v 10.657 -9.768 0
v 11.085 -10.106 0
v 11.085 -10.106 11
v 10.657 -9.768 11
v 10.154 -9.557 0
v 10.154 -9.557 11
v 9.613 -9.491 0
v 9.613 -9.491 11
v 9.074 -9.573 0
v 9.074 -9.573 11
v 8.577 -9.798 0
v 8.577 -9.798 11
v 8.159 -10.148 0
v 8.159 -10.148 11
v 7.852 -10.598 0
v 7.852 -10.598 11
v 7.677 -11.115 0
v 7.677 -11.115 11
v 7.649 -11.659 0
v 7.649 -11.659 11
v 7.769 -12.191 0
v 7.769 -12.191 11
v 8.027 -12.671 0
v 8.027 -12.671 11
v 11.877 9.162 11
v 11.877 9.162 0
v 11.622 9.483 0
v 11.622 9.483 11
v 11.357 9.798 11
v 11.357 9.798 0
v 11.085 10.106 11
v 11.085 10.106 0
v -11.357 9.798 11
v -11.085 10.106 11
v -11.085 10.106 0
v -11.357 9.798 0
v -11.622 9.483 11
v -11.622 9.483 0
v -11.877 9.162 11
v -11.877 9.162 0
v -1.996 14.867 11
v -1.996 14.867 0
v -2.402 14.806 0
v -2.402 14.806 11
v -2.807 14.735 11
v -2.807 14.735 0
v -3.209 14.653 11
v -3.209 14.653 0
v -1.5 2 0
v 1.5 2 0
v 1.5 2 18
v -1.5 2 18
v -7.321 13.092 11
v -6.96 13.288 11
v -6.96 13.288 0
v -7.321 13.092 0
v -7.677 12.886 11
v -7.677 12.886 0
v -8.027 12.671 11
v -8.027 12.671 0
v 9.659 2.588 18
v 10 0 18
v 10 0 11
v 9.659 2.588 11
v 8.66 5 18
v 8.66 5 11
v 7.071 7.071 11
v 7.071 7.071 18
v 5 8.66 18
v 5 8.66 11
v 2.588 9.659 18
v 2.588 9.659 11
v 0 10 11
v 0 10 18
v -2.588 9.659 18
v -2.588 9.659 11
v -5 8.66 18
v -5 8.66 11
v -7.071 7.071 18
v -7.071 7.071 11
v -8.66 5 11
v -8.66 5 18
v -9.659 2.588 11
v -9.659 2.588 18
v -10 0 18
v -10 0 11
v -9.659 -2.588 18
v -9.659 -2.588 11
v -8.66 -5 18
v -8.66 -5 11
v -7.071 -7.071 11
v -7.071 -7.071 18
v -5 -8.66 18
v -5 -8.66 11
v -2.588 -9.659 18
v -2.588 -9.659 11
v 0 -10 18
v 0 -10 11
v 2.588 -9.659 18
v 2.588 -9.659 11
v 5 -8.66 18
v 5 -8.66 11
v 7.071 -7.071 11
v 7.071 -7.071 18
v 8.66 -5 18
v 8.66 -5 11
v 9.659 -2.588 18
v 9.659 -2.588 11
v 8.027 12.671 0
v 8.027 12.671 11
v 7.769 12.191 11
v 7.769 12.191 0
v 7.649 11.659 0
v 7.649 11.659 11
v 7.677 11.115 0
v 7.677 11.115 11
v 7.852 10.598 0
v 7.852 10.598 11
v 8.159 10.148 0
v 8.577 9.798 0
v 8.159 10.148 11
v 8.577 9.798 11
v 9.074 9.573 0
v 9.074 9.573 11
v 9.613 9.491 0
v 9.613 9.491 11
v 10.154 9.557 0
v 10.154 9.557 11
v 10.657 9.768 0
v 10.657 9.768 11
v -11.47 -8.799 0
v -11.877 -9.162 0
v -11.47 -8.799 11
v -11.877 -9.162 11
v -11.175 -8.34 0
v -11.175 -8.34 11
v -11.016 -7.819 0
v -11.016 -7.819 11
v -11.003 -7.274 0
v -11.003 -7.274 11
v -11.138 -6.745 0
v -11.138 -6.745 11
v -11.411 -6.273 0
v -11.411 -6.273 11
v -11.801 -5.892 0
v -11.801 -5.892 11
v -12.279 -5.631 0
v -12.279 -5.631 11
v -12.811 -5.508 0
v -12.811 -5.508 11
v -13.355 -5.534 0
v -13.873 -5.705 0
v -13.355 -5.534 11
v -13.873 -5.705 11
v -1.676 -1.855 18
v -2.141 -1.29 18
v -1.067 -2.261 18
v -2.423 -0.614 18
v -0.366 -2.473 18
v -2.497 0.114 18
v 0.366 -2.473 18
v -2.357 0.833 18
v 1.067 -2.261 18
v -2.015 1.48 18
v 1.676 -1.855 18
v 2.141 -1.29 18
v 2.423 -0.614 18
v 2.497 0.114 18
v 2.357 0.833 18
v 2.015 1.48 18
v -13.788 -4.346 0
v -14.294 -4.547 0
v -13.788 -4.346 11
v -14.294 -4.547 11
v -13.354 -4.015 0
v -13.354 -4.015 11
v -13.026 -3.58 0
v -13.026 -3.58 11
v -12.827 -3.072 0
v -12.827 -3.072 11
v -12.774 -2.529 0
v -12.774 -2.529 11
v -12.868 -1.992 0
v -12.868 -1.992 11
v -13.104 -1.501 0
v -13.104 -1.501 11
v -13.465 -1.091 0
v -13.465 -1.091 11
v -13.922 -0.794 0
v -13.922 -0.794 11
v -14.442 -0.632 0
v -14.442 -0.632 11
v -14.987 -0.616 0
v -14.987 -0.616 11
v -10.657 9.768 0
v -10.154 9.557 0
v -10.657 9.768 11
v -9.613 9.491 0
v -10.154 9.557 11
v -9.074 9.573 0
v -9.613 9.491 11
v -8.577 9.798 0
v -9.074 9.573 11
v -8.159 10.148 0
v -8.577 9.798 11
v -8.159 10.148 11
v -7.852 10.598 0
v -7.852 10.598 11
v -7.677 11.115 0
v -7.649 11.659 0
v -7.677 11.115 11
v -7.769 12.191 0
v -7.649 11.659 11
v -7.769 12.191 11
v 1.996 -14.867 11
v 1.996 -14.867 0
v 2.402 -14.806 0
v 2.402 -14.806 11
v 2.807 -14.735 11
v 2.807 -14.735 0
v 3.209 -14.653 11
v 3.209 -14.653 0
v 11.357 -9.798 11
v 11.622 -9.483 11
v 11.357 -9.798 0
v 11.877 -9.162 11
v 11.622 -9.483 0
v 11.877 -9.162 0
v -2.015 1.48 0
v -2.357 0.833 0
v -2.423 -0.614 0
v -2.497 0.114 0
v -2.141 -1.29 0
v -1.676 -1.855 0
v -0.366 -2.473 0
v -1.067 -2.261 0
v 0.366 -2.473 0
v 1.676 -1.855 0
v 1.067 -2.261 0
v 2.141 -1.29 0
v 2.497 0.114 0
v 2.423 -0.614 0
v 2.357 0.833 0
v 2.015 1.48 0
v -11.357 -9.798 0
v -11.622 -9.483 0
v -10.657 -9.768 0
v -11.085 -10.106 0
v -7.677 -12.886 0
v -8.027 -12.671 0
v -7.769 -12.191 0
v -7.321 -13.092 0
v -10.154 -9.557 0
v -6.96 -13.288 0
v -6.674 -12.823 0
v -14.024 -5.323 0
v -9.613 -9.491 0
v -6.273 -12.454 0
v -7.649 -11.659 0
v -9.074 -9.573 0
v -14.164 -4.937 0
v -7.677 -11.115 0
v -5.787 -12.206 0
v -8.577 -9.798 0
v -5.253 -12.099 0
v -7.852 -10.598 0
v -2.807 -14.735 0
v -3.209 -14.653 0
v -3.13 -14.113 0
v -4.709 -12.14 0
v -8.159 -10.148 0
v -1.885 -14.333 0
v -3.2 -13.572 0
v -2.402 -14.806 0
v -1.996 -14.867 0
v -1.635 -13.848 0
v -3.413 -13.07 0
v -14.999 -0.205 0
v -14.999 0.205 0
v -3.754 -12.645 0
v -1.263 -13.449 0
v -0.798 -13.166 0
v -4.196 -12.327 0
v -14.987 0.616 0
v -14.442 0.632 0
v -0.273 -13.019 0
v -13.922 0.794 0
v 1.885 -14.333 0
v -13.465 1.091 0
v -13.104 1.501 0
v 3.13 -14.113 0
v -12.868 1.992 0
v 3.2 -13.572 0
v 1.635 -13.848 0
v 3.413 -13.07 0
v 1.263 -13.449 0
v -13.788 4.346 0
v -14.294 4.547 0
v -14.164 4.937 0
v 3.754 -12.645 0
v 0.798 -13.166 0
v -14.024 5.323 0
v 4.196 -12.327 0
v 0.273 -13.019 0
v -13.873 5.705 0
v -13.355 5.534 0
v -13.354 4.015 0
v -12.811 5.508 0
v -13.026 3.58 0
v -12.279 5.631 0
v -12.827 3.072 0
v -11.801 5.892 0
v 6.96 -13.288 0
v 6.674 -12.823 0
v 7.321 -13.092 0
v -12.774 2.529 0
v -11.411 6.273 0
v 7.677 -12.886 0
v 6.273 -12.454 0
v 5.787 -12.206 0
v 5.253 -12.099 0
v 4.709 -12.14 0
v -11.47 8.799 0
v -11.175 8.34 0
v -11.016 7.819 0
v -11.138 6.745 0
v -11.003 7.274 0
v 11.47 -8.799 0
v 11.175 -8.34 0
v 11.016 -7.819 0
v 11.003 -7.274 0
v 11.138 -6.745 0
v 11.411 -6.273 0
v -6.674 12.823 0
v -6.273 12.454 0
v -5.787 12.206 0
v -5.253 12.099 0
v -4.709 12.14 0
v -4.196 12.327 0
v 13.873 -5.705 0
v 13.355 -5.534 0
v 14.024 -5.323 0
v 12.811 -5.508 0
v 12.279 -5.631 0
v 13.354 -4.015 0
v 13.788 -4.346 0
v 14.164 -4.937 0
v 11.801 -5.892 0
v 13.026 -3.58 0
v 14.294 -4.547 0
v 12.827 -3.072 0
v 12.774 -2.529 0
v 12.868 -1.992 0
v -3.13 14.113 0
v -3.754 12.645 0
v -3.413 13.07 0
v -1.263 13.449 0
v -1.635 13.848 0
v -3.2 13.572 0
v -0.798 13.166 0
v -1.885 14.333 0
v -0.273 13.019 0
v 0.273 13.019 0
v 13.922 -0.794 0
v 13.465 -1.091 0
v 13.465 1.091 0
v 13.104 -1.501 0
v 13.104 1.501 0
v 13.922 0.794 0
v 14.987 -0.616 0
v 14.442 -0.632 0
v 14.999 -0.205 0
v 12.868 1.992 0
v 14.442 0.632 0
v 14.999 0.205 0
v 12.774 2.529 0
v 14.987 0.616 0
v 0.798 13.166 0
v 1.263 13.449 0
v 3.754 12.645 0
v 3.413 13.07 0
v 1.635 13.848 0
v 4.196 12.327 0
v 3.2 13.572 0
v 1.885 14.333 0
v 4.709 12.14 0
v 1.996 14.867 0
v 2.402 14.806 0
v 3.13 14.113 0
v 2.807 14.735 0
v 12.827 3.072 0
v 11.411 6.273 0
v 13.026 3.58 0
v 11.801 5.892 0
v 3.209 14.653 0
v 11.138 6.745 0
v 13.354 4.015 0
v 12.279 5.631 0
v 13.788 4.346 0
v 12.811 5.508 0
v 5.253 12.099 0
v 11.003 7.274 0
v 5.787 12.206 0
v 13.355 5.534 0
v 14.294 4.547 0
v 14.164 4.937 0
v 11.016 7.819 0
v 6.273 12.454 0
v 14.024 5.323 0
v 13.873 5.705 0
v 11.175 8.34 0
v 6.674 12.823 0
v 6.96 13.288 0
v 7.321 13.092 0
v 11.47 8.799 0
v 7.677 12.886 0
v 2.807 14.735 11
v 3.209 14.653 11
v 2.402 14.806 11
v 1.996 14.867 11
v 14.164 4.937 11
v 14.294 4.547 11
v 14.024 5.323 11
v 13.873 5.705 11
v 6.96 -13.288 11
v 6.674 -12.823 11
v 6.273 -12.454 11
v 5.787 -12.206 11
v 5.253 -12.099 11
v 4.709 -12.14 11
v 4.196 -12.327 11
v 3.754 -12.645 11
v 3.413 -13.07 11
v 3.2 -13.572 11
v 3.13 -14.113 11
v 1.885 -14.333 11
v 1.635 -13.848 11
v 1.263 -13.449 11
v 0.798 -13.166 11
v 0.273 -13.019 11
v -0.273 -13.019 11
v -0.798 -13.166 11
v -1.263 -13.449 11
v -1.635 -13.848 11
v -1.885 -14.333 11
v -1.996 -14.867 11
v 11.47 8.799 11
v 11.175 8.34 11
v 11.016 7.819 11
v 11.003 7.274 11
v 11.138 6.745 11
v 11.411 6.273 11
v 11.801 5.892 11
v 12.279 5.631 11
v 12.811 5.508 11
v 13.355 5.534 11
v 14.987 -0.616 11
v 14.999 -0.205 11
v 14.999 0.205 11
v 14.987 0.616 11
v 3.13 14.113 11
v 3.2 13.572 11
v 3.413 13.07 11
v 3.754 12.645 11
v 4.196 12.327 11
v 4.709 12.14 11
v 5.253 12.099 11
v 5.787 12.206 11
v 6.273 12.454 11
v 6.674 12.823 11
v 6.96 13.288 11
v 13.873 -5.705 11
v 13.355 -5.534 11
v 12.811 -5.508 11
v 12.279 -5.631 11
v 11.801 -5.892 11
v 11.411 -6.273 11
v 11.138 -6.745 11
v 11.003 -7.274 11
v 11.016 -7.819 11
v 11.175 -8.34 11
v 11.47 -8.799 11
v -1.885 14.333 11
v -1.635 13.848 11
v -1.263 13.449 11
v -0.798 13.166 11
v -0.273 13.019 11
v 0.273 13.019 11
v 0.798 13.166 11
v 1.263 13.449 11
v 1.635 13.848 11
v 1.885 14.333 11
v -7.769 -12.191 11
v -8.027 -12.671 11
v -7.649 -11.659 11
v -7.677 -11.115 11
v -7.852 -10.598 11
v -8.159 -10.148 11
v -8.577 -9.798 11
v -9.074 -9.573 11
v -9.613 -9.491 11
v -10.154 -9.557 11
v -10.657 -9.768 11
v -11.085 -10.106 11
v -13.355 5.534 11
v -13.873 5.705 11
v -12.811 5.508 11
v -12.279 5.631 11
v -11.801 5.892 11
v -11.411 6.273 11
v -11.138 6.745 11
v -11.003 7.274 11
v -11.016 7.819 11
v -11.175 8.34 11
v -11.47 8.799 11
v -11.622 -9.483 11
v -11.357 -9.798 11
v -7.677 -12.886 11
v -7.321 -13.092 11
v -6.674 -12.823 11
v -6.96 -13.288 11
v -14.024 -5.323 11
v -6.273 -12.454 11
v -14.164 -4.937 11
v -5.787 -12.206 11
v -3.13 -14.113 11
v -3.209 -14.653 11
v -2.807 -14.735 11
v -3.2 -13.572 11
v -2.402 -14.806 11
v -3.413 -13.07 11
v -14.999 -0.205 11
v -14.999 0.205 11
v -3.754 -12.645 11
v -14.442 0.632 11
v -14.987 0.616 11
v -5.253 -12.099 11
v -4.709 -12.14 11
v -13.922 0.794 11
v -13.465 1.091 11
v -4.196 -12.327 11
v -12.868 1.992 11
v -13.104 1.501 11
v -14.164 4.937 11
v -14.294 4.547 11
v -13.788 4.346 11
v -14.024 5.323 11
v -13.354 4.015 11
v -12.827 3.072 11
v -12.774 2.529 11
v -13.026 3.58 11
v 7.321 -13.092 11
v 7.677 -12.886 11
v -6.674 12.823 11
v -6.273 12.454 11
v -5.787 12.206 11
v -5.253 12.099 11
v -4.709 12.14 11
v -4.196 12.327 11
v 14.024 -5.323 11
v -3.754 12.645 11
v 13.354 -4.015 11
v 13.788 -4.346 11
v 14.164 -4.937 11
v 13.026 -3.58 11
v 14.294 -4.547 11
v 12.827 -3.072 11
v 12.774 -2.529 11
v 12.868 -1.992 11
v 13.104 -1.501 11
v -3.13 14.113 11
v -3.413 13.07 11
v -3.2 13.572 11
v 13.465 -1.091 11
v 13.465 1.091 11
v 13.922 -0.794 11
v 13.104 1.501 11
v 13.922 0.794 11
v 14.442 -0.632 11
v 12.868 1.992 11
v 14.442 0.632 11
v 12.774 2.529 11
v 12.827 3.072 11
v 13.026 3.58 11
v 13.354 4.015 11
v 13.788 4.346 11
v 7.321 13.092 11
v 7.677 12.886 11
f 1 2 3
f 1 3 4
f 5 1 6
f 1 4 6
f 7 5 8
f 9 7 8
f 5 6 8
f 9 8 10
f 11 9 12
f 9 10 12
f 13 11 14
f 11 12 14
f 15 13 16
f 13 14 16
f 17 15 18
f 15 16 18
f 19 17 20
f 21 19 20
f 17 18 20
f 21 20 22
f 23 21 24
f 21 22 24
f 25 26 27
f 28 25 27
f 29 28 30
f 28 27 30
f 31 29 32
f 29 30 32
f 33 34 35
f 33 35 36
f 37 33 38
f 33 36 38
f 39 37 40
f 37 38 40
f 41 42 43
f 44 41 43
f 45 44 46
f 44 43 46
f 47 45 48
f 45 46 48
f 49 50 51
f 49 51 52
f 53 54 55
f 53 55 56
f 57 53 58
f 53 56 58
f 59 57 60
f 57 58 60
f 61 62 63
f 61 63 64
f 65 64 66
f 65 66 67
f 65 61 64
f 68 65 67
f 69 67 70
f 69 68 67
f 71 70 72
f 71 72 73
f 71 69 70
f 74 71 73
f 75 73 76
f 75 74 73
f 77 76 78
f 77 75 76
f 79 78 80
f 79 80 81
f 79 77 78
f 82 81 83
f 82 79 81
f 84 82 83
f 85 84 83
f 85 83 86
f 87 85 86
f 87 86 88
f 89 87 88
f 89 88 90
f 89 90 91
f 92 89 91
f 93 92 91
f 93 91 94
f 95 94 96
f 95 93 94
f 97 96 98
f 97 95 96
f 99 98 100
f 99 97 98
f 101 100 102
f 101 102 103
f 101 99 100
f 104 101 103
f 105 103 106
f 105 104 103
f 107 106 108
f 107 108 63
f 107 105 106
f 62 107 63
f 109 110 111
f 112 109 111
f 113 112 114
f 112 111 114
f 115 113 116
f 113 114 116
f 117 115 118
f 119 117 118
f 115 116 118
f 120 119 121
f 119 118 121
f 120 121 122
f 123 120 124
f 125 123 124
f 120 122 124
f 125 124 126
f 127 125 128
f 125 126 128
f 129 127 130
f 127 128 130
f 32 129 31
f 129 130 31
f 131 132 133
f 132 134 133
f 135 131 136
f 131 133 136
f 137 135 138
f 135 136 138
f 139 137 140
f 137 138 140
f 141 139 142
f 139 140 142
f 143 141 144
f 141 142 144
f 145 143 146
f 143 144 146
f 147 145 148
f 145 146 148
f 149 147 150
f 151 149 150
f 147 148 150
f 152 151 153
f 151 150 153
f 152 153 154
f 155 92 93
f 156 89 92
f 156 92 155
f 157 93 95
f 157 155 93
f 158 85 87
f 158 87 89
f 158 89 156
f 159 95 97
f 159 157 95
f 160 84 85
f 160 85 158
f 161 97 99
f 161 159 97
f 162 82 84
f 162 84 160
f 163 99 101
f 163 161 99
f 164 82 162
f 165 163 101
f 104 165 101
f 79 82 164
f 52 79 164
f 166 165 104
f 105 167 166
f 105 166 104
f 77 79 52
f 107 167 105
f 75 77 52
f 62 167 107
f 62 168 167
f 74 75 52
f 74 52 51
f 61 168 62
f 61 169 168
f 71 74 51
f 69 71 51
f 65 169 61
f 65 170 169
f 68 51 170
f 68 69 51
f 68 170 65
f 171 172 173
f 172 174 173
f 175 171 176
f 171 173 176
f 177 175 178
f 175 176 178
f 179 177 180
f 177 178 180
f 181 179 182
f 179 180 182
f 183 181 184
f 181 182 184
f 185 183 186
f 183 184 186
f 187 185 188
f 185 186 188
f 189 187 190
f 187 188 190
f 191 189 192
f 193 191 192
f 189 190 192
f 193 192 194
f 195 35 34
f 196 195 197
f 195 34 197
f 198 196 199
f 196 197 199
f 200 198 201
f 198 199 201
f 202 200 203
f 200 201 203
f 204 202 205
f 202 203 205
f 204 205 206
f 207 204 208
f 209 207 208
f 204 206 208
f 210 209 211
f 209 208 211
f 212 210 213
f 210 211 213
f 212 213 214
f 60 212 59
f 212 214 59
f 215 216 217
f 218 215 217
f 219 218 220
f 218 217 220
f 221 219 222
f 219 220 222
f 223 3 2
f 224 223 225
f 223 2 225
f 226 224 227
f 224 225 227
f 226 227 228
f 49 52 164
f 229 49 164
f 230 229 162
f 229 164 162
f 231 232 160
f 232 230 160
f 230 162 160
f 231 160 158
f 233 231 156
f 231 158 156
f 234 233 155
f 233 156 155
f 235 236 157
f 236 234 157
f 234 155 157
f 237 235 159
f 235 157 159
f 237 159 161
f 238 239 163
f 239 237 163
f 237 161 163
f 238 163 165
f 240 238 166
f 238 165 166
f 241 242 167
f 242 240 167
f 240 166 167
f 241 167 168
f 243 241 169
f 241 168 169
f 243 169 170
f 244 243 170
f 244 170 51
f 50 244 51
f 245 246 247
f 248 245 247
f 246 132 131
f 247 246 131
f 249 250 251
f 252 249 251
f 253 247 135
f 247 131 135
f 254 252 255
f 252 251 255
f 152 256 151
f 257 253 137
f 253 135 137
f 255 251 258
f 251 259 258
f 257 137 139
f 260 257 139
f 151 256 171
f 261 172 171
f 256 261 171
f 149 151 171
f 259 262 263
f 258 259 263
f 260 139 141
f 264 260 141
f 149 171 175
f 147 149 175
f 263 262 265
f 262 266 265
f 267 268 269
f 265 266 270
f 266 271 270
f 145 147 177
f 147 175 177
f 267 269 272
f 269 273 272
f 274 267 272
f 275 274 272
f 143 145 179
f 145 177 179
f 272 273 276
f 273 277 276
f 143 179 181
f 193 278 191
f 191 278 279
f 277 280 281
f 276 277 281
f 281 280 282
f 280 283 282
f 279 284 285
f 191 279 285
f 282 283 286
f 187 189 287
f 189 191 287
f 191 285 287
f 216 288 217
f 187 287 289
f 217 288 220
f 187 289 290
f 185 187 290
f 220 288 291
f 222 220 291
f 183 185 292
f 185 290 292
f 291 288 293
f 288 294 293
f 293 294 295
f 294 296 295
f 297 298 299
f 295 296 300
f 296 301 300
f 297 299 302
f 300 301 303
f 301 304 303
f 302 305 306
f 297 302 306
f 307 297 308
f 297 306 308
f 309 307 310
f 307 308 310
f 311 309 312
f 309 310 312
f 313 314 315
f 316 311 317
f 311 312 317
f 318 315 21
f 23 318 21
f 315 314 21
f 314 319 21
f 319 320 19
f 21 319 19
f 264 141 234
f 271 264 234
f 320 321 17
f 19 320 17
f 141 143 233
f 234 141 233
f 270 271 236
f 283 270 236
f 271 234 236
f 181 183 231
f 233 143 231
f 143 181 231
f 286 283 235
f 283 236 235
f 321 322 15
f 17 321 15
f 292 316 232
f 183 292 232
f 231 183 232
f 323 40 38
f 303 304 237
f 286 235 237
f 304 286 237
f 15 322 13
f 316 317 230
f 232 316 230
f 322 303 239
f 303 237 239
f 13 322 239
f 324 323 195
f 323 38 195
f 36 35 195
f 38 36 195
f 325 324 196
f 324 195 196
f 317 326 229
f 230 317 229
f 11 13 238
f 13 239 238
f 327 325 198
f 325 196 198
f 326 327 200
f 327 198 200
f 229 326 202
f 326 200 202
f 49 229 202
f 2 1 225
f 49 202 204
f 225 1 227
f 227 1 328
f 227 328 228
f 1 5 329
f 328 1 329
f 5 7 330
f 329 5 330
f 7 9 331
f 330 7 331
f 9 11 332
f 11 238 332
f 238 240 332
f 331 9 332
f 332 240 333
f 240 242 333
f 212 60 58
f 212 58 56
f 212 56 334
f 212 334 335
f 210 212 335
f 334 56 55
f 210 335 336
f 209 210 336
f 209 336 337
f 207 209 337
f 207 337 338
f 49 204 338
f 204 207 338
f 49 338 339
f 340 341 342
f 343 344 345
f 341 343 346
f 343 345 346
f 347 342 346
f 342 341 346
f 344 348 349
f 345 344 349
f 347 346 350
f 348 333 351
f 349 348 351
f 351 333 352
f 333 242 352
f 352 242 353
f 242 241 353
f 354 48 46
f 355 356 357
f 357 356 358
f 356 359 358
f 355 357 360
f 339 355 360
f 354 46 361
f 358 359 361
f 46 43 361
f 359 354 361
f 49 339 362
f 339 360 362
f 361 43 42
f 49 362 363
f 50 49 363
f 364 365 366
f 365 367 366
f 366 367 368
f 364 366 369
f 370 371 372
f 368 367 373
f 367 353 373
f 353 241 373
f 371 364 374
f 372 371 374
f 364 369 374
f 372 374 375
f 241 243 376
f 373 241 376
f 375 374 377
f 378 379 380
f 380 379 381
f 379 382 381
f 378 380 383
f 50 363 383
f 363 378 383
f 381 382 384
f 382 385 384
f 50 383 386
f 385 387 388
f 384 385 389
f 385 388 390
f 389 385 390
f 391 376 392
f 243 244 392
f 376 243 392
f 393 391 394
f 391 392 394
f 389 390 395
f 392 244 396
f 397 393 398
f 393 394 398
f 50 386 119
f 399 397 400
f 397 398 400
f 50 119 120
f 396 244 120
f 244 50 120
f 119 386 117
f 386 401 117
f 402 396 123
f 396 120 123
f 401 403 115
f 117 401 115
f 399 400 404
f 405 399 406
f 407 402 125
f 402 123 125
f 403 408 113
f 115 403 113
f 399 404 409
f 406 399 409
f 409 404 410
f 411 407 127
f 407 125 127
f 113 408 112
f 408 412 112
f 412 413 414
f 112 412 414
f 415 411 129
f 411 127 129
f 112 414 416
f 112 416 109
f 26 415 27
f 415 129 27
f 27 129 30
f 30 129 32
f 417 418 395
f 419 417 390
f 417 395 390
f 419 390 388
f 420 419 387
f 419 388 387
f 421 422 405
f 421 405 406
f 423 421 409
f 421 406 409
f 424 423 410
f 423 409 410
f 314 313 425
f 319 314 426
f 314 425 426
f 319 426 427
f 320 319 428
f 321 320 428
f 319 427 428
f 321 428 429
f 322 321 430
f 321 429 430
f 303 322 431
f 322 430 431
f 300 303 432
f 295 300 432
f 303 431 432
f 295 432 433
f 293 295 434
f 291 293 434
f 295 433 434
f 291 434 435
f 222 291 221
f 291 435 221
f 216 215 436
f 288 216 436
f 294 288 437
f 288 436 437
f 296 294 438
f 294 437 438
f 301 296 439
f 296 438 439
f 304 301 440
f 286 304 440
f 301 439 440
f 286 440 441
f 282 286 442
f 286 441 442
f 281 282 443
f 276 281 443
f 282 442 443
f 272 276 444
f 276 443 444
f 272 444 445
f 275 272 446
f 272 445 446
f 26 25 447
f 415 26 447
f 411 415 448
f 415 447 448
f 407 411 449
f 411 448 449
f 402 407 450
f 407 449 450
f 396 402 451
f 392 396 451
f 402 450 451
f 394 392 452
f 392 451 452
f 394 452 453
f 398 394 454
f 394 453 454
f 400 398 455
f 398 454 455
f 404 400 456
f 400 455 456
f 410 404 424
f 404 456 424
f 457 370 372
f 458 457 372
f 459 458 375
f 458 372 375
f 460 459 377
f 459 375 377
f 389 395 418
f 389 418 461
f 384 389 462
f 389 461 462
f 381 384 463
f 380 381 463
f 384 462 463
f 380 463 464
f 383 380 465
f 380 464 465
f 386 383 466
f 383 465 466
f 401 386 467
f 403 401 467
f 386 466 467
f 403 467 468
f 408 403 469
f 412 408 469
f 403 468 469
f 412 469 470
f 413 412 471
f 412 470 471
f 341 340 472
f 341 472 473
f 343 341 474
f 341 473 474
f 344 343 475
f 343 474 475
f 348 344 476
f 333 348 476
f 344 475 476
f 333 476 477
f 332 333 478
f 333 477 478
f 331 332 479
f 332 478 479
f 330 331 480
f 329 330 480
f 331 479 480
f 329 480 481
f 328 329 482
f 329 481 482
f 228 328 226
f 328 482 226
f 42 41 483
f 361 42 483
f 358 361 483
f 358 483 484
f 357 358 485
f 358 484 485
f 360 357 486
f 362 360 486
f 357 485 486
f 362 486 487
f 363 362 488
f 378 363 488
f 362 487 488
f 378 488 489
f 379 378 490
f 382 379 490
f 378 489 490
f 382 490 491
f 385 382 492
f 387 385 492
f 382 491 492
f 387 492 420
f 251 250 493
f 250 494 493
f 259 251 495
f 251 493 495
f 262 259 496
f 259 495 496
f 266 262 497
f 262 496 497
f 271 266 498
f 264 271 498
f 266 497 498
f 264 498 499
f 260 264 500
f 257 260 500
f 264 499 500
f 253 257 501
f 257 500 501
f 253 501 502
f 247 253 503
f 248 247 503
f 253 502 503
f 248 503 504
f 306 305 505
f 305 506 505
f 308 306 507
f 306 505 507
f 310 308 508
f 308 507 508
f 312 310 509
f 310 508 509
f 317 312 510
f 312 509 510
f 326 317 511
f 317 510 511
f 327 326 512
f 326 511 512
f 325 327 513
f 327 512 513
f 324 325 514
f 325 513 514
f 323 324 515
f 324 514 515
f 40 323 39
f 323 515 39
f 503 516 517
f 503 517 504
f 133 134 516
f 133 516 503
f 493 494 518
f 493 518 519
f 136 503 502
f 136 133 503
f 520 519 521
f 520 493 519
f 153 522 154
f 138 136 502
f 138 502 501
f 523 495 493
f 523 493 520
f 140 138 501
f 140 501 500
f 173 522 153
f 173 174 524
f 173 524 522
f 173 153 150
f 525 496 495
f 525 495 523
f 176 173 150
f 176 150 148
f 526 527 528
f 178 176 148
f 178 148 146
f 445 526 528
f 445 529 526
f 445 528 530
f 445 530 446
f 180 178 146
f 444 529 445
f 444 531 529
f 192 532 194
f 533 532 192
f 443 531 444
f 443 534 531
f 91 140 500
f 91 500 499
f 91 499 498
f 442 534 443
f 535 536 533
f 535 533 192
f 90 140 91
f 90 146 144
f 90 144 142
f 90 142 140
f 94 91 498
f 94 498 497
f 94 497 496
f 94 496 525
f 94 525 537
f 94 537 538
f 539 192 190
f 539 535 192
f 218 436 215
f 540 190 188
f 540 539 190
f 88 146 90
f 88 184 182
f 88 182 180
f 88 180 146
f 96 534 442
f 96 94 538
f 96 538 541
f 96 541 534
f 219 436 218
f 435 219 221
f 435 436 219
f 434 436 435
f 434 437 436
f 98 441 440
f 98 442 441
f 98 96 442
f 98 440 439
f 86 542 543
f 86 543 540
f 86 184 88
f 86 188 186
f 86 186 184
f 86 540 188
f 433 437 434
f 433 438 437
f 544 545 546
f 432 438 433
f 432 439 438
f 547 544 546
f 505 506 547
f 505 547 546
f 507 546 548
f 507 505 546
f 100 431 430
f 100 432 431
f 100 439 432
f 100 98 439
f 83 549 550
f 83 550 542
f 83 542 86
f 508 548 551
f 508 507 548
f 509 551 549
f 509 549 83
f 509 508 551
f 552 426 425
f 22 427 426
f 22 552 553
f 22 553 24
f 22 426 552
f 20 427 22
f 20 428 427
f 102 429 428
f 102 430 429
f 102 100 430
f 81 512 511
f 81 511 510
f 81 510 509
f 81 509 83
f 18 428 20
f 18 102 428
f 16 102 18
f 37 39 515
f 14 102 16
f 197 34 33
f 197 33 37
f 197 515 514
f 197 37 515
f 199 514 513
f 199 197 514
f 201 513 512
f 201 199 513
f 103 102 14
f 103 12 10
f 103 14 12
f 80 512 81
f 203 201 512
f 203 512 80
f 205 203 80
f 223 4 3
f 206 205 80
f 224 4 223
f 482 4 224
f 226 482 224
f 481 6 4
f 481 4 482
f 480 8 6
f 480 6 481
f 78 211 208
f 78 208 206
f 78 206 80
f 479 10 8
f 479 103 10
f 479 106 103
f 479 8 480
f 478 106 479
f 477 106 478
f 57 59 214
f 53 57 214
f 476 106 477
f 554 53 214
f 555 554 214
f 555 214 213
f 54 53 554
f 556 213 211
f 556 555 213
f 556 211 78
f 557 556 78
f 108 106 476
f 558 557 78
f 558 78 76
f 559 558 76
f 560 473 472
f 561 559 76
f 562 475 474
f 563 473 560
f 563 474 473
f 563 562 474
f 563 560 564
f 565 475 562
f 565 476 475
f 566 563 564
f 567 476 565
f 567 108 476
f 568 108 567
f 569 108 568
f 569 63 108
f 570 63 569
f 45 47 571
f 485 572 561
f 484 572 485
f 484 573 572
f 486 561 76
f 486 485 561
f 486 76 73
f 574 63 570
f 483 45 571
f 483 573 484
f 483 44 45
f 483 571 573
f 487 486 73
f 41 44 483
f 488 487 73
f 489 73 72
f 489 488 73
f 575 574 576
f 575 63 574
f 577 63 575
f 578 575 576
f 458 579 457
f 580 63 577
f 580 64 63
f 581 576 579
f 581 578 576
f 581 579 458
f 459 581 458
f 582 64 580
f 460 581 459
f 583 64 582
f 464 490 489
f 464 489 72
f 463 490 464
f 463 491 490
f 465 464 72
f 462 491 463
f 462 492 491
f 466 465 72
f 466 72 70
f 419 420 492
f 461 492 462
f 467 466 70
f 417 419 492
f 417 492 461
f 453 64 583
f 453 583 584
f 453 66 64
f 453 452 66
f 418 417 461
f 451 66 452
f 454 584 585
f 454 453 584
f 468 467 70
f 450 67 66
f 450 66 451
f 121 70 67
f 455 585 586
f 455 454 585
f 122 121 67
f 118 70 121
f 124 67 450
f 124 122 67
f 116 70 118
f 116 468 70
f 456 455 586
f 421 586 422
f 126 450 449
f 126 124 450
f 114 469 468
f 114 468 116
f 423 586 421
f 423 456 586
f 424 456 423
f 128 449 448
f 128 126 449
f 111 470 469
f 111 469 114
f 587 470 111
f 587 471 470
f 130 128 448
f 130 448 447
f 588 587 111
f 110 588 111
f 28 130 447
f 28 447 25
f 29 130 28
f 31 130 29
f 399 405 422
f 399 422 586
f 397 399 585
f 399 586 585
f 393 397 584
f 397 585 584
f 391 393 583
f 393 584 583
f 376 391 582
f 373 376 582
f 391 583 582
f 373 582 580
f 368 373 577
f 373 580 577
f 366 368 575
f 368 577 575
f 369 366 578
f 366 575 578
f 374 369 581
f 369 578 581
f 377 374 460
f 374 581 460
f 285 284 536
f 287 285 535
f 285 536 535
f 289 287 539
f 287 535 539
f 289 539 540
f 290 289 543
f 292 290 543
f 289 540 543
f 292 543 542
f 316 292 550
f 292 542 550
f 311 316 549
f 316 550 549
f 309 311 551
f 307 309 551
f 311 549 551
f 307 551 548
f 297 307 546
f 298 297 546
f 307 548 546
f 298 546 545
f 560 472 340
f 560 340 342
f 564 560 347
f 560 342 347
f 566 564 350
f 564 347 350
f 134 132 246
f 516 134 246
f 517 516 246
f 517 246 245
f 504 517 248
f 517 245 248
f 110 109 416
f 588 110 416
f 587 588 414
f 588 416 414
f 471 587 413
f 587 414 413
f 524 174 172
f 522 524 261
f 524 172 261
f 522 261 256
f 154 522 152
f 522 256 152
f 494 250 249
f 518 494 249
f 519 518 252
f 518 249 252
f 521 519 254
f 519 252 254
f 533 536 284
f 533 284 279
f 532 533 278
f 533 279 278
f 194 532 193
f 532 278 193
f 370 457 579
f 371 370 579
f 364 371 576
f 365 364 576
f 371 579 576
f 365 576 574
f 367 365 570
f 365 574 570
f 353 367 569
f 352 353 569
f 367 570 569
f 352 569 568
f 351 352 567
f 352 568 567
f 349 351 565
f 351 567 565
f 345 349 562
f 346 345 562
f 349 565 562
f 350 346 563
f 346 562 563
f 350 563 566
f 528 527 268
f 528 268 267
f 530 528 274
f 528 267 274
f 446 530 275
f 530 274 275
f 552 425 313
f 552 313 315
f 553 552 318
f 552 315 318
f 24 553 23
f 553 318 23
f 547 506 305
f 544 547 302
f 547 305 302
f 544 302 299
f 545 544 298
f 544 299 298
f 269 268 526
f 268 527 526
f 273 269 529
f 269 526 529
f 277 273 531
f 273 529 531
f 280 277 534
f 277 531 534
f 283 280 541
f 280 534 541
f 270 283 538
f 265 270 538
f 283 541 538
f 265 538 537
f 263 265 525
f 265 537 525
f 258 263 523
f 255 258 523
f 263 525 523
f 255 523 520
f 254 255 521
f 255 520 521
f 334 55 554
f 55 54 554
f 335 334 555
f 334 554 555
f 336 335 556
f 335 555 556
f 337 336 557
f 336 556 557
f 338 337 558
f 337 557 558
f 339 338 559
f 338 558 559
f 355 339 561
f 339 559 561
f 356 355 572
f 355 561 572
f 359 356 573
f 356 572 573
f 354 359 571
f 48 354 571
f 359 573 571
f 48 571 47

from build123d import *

# Parameters (mm, degrees)
SKETCH1_R           = 15
BOSS_EXTRUDE1_DEPTH = 11
SKETCH2_R           = 2
CUT_EXTRUDE1_DEPTH  = 11
SKETCH3_R           = 2.5
CUT_EXTRUDE2_DEPTH  = 11
BOSS_EXTRUDE2_START = 7
SKETCH5_R           = 10
SKETCH5_R_2         = 2.5
BOSS_EXTRUDE2_DEPTH = 7
BOSS_EXTRUDE3_DEPTH = 18


with BuildPart() as part:
    # Sketch1 → Boss-Extrude1 (new body)
    with BuildSketch(Plane.XY):
        Circle(SKETCH1_R)
    extrude(amount=BOSS_EXTRUDE1_DEPTH)

    # Sketch2 → Cut-Extrude1 (cut)
    with BuildSketch(Plane.XY.offset(11)):
        with Locations((0, 15)):
            Circle(SKETCH2_R)
        with Locations((5.13030215, 14.095389312)):
            Circle(SKETCH2_R)
        with Locations((9.641814145, 11.490666647)):
            Circle(SKETCH2_R)
        with Locations((12.990381057, 7.5)):
            Circle(SKETCH2_R)
        with Locations((14.772116295, 2.604722665)):
            Circle(SKETCH2_R)
        with Locations((14.772116295, -2.604722665)):
            Circle(SKETCH2_R)
        with Locations((12.990381057, -7.5)):
            Circle(SKETCH2_R)
        with Locations((9.641814145, -11.490666647)):
            Circle(SKETCH2_R)
        with Locations((5.13030215, -14.095389312)):
            Circle(SKETCH2_R)
        with Locations((0, -15)):
            Circle(SKETCH2_R)
        with Locations((-5.13030215, -14.095389312)):
            Circle(SKETCH2_R)
        with Locations((-9.641814145, -11.490666647)):
            Circle(SKETCH2_R)
        with Locations((-12.990381057, -7.5)):
            Circle(SKETCH2_R)
        with Locations((-14.772116295, -2.604722665)):
            Circle(SKETCH2_R)
        with Locations((-14.772116295, 2.604722665)):
            Circle(SKETCH2_R)
        with Locations((-12.990381057, 7.5)):
            Circle(SKETCH2_R)
        with Locations((-9.641814145, 11.490666647)):
            Circle(SKETCH2_R)
        with Locations((-5.13030215, 14.095389312)):
            Circle(SKETCH2_R)
    extrude(amount=-CUT_EXTRUDE1_DEPTH, mode=Mode.SUBTRACT)

    # Sketch3 → Cut-Extrude2 (cut)
    with BuildSketch(Plane.XY.offset(11)):
        Circle(SKETCH3_R)
    extrude(amount=-CUT_EXTRUDE2_DEPTH, mode=Mode.SUBTRACT)

    # Sketch5 → Boss-Extrude2 (add)
    with BuildSketch(Plane.XY.offset(11).offset(BOSS_EXTRUDE2_START)):
        Circle(SKETCH5_R)
        Circle(SKETCH5_R_2, mode=Mode.SUBTRACT)
    extrude(amount=-BOSS_EXTRUDE2_DEPTH)

    # Sketch6 → Boss-Extrude3 (add)
    with BuildSketch(Plane.XY.offset(18)):
        with BuildLine():
            Line((1.5, 2), (-1.5, 2))
            ThreePointArc((-1.5, 2), (0, 2.5), (1.5, 2))
        make_face()
    extrude(amount=-BOSS_EXTRUDE3_DEPTH)


solid = part.part
